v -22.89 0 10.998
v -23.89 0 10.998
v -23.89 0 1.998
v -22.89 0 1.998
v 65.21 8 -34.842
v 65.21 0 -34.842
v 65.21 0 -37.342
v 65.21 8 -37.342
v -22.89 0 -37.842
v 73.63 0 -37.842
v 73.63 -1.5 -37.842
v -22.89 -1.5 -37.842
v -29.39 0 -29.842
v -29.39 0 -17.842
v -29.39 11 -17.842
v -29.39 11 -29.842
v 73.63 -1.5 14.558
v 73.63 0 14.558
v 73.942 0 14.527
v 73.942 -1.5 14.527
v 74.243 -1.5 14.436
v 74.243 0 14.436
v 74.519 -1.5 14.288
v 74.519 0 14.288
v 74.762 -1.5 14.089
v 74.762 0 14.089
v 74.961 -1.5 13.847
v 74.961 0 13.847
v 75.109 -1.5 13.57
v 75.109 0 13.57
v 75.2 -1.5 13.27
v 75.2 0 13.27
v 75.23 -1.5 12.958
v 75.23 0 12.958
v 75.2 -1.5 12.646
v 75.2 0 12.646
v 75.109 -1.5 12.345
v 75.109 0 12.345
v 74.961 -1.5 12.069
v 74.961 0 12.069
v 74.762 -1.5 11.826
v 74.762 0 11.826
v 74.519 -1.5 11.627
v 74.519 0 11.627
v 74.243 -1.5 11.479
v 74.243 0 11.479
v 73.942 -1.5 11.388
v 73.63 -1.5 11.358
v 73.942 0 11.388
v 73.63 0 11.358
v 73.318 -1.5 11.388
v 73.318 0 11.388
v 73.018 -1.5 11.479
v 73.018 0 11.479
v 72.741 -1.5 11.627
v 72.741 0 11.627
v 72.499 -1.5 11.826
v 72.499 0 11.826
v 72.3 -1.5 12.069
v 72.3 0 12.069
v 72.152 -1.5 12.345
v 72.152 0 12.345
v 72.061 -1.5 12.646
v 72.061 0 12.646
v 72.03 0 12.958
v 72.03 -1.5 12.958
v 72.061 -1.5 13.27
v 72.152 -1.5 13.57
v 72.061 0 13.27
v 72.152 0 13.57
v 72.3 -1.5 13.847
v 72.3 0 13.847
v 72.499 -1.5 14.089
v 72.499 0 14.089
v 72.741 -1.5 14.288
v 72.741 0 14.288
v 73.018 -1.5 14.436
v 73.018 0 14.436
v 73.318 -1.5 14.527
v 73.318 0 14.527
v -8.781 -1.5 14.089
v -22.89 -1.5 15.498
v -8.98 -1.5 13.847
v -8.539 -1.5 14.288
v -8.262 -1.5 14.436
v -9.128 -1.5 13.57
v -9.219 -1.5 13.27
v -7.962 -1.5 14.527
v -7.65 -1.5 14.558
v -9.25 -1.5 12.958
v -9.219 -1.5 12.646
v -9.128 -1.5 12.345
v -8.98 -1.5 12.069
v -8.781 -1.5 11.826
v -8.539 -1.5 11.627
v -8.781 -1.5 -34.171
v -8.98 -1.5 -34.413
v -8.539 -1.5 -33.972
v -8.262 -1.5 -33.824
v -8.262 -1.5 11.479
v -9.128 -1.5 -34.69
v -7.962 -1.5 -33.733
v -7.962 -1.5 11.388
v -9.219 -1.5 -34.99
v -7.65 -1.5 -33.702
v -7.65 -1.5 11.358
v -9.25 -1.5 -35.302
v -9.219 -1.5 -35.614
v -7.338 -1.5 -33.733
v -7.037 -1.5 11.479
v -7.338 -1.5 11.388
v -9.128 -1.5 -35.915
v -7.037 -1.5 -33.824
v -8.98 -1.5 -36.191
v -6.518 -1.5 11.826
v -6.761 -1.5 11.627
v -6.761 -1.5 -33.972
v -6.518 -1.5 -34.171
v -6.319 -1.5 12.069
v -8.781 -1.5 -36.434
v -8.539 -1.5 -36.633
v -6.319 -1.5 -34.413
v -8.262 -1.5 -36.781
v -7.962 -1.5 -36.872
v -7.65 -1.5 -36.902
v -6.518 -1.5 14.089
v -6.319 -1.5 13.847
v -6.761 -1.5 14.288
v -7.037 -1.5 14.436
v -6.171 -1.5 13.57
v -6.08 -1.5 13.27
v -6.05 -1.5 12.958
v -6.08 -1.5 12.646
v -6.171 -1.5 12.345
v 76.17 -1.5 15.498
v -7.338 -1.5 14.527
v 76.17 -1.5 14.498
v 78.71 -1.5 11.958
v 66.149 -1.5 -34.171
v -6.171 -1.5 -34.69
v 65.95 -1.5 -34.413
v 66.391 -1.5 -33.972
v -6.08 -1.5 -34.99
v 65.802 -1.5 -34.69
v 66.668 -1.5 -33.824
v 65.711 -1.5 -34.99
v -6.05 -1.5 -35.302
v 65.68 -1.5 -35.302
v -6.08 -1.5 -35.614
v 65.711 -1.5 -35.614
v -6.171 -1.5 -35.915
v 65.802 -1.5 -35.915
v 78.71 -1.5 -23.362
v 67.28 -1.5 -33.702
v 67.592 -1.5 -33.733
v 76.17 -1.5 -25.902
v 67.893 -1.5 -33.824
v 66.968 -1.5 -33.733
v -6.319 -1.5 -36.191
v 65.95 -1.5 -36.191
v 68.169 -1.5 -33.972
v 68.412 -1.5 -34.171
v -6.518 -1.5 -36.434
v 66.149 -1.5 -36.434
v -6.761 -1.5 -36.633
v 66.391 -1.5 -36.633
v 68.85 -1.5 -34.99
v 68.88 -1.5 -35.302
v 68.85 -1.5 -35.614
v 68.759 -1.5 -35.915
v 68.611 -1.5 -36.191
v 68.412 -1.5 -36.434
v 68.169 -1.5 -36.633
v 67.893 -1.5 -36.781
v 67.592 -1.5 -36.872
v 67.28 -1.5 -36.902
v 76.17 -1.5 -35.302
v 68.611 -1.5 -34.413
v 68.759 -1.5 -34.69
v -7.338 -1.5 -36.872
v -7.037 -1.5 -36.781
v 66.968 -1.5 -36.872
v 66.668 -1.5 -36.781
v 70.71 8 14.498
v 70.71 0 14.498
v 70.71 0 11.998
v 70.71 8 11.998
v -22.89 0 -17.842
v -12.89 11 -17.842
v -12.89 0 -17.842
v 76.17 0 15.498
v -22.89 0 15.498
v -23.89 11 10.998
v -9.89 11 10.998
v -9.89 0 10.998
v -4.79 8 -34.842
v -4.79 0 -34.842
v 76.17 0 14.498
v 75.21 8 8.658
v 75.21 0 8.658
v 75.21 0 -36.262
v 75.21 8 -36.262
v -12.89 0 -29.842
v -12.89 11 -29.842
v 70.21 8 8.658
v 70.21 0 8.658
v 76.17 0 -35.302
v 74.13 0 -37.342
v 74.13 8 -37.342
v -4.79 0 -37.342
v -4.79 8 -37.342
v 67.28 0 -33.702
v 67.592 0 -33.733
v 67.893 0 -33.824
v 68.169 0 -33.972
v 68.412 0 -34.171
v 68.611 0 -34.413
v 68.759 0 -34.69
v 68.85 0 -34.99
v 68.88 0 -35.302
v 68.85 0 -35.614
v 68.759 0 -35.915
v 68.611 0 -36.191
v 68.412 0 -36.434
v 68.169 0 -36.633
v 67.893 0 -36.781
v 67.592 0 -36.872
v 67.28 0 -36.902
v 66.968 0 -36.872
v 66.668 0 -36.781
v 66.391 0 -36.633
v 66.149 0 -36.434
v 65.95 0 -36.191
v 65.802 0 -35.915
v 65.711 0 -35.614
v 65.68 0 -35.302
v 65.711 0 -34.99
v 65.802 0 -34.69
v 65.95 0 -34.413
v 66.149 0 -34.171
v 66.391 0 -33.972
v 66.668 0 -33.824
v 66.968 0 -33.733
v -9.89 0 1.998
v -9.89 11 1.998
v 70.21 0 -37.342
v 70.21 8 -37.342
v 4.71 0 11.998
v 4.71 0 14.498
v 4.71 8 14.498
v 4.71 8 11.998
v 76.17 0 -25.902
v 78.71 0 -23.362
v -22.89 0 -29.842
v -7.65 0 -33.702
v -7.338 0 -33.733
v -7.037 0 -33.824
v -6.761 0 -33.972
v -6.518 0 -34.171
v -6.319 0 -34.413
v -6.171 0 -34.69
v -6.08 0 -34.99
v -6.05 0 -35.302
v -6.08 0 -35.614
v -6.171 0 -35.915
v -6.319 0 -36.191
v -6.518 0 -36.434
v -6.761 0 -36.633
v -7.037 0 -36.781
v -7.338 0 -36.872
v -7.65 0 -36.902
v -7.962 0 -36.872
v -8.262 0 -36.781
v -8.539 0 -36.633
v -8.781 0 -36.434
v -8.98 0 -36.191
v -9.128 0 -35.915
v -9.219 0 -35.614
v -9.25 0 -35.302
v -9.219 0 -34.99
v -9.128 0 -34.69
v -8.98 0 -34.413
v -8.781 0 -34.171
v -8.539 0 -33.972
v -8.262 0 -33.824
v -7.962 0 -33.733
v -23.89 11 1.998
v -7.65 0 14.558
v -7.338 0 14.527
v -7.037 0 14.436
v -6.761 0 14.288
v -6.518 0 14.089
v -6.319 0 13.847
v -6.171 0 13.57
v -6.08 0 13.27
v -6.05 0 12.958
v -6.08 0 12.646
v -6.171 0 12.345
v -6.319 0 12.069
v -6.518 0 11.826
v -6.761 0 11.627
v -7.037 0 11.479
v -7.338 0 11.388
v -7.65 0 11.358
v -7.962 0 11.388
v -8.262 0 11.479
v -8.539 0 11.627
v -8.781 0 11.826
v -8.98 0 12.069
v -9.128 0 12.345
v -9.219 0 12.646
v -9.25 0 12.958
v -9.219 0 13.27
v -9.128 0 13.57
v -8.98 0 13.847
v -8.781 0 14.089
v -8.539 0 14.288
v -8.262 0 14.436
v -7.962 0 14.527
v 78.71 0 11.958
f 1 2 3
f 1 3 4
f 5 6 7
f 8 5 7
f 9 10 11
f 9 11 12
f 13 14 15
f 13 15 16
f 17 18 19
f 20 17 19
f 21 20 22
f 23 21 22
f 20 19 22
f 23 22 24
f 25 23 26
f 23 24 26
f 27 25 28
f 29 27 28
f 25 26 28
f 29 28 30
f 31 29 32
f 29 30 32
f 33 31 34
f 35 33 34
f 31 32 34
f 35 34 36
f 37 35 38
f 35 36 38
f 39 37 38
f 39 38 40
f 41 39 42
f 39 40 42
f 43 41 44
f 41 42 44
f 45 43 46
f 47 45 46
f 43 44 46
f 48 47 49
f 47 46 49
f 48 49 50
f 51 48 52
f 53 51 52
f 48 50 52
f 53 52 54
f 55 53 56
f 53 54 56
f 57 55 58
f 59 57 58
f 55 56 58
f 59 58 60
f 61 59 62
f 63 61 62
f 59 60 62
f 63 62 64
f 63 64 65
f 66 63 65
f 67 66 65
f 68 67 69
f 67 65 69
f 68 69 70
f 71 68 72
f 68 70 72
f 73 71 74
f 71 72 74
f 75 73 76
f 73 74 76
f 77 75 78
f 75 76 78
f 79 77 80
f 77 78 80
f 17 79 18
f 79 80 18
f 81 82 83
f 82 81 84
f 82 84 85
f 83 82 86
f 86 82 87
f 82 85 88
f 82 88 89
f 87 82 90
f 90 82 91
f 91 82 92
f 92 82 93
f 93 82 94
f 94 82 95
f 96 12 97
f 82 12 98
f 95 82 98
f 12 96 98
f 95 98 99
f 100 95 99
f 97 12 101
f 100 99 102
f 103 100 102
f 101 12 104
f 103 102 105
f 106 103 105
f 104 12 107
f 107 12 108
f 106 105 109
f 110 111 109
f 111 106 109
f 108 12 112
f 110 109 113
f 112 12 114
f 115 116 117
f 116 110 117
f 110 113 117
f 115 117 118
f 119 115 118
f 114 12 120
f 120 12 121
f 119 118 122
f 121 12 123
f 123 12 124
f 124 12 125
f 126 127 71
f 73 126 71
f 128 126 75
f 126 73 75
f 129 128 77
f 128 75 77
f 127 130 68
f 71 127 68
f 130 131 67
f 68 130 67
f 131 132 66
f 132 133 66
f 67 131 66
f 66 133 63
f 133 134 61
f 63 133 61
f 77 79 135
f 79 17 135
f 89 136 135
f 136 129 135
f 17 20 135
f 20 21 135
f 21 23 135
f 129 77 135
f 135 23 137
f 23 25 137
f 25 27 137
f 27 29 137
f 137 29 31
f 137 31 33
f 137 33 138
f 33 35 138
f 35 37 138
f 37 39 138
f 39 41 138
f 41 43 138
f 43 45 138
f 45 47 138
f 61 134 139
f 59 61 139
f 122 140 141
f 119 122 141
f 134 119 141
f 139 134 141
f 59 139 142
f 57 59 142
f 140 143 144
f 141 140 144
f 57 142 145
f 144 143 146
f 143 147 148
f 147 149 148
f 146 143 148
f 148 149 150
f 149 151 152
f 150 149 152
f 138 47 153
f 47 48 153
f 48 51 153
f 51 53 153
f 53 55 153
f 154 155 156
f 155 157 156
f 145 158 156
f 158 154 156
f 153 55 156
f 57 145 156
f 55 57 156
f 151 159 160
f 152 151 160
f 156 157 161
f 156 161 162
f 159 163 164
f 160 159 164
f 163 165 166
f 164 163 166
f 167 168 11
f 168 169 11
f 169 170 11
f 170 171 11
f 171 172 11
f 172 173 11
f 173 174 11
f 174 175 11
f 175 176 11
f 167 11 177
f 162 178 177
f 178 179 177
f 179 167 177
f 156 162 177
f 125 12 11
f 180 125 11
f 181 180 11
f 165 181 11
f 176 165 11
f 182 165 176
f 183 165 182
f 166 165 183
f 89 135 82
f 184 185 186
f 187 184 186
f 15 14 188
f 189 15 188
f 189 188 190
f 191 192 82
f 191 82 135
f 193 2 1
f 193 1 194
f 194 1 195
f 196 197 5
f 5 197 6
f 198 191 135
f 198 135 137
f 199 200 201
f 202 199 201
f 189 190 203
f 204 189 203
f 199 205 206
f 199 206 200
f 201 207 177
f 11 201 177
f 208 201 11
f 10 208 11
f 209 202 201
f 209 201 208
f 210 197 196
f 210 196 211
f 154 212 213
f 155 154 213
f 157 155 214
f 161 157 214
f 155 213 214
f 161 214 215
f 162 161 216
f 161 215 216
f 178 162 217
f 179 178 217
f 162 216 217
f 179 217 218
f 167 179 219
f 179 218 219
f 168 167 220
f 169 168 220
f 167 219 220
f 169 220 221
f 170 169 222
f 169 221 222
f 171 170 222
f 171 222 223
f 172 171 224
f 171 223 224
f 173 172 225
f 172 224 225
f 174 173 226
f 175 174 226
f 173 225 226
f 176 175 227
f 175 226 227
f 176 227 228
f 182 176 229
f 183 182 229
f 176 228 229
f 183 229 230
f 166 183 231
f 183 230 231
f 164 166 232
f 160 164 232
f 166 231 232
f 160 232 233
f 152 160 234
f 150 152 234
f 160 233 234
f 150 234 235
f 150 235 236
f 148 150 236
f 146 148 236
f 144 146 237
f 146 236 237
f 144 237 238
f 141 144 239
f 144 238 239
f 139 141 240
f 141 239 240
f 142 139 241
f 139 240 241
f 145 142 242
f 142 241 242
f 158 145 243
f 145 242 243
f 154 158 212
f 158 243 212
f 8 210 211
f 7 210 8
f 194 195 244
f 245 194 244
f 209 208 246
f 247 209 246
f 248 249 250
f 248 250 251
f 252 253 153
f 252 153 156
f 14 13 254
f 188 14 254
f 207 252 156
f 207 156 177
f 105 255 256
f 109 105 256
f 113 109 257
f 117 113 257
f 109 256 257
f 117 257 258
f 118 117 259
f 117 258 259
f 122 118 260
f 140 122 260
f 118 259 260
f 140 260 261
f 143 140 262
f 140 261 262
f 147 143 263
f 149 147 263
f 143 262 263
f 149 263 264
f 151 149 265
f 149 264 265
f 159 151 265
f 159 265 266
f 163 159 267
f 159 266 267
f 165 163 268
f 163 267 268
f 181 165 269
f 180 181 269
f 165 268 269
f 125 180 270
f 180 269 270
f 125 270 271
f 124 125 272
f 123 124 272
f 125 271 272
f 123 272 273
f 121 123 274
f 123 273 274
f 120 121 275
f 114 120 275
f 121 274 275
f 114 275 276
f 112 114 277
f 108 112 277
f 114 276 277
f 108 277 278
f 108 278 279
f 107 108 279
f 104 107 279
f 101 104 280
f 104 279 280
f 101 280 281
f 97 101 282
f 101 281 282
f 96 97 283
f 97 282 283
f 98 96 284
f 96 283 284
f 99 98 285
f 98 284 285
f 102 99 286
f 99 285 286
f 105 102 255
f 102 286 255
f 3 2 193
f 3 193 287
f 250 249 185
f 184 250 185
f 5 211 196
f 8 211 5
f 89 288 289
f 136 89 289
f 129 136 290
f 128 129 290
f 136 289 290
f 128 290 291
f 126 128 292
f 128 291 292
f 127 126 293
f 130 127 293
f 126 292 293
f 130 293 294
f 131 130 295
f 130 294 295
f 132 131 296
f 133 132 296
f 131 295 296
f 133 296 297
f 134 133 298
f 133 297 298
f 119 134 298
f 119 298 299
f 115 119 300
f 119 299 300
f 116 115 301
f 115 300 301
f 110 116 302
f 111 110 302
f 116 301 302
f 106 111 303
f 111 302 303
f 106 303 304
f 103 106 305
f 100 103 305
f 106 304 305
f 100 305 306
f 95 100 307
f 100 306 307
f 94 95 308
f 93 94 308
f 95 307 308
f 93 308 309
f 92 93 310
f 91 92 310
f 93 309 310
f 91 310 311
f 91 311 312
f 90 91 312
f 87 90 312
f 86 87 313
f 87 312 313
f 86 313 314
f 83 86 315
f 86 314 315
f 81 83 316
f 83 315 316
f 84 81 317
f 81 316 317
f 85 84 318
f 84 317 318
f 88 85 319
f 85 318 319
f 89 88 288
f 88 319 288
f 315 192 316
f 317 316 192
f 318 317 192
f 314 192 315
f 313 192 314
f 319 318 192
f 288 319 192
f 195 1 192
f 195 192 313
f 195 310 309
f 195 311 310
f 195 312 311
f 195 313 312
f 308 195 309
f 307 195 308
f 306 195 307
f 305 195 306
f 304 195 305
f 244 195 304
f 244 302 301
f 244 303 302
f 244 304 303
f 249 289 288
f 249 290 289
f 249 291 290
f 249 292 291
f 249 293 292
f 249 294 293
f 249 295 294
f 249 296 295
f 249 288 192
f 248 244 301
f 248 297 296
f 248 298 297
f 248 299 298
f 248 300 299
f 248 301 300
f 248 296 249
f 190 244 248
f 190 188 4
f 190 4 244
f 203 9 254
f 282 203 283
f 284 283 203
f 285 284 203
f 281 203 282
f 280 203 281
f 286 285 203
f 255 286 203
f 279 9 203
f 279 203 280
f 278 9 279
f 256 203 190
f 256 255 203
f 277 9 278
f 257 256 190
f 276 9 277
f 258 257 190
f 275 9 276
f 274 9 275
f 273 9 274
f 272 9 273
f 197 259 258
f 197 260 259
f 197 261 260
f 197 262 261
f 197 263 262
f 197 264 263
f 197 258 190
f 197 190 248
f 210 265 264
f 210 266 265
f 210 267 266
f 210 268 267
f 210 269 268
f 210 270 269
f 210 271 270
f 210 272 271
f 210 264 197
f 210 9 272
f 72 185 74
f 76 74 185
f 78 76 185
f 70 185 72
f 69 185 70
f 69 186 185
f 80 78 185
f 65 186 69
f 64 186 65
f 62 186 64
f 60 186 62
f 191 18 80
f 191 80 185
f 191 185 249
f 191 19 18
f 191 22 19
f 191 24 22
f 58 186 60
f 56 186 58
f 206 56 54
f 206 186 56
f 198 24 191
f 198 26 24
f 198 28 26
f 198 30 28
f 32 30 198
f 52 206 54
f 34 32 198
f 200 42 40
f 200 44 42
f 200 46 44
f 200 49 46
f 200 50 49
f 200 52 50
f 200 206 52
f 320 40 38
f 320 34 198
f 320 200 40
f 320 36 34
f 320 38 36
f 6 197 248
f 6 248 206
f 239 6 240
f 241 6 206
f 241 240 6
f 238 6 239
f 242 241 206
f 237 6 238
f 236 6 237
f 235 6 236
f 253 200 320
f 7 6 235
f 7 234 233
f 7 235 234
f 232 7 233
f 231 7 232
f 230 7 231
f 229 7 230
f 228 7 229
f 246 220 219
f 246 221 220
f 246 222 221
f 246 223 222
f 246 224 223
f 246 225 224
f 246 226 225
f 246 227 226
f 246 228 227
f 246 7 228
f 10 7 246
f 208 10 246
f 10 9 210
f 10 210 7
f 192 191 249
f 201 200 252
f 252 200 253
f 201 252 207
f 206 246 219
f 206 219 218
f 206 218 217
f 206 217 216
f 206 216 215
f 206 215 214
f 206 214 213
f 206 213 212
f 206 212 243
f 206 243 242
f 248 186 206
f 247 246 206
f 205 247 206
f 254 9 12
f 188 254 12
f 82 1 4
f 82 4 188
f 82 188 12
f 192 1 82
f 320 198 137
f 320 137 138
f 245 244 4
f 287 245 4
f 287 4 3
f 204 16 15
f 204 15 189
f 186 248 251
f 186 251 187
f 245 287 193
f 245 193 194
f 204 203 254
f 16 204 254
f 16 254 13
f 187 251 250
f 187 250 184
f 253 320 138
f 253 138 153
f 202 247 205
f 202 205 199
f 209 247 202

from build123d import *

# Parameters (mm, degrees)
SKETCH_1_R      = 1.6
EXTRUDE_1_DEPTH = 1.5
SKETCH_1_3_W    = 70
SKETCH_1_3_H    = 2.5
SKETCH_1_3_W_2  = 66
EXTRUDE_2_DEPTH = 8
SKETCH_1_4_W    = 16.5
SKETCH_1_4_H    = 12
EXTRUDE_3_DEPTH = 11
SKETCH_1_5_W    = 14
SKETCH_1_5_H    = 9
EXTRUDE_4_DEPTH = 11


with BuildPart() as part:
    # Эскиз1 → Бобышка-Вытянуть1 (new body)
    with BuildSketch(Plane(origin=(0, 0, 0), x_dir=(1, 0, 0), z_dir=(0, 1, 0))):
        Polygon((-22.889699569, -15.497660222), (76.170300431, -15.497660222), (76.170300431, -14.497660222), (78.710300431, -11.957660222), (78.710300431, 23.362339778), (76.170300431, 25.902339778), (76.170300431, 35.302339778), (73.630300431, 37.842339778), (-22.889699569, 37.842339778), align=None)
        with Locations((-7.649699569, -12.957660222)):
            Circle(SKETCH_1_R, mode=Mode.SUBTRACT)
        with Locations((73.630300431, -12.957660222)):
            Circle(SKETCH_1_R, mode=Mode.SUBTRACT)
        with Locations((-7.649699569, 35.302339778)):
            Circle(SKETCH_1_R, mode=Mode.SUBTRACT)
        with Locations((67.280300431, 35.302339778)):
            Circle(SKETCH_1_R, mode=Mode.SUBTRACT)
    extrude(amount=-EXTRUDE_1_DEPTH)

    # Эскиз1<3> → Бобышка-Вытянуть2 (add)
    with BuildSketch(Plane(origin=(0, 0, 0), x_dir=(1, 0, 0), z_dir=(0, 1, 0))):
        Polygon((75.210300431, 36.262339778), (74.130300431, 37.342339778), (70.210300431, 37.342339778), (70.210300431, -8.657660222), (75.210300431, -8.657660222), align=None)
        with Locations((30.210300431, 36.092339778)):
            Rectangle(SKETCH_1_3_W, SKETCH_1_3_H)
        with Locations((37.710300431, -13.247660222)):
            Rectangle(SKETCH_1_3_W_2, SKETCH_1_3_H)
    extrude(amount=EXTRUDE_2_DEPTH)

    # Эскиз1<4> → Бобышка-Вытянуть3 (add)
    with BuildSketch(Plane(origin=(0, 0, 0), x_dir=(1, 0, 0), z_dir=(0, 1, 0))):
        with Locations((-21.139699569, 23.842339778)):
            Rectangle(SKETCH_1_4_W, SKETCH_1_4_H)
    extrude(amount=EXTRUDE_3_DEPTH)

    # Эскиз1<5> → Бобышка-Вытянуть4 (add)
    with BuildSketch(Plane(origin=(0, 0, 0), x_dir=(1, 0, 0), z_dir=(0, 1, 0))):
        with Locations((-16.889699569, -6.497660222)):
            Rectangle(SKETCH_1_5_W, SKETCH_1_5_H)
    extrude(amount=EXTRUDE_4_DEPTH)


solid = part.part
